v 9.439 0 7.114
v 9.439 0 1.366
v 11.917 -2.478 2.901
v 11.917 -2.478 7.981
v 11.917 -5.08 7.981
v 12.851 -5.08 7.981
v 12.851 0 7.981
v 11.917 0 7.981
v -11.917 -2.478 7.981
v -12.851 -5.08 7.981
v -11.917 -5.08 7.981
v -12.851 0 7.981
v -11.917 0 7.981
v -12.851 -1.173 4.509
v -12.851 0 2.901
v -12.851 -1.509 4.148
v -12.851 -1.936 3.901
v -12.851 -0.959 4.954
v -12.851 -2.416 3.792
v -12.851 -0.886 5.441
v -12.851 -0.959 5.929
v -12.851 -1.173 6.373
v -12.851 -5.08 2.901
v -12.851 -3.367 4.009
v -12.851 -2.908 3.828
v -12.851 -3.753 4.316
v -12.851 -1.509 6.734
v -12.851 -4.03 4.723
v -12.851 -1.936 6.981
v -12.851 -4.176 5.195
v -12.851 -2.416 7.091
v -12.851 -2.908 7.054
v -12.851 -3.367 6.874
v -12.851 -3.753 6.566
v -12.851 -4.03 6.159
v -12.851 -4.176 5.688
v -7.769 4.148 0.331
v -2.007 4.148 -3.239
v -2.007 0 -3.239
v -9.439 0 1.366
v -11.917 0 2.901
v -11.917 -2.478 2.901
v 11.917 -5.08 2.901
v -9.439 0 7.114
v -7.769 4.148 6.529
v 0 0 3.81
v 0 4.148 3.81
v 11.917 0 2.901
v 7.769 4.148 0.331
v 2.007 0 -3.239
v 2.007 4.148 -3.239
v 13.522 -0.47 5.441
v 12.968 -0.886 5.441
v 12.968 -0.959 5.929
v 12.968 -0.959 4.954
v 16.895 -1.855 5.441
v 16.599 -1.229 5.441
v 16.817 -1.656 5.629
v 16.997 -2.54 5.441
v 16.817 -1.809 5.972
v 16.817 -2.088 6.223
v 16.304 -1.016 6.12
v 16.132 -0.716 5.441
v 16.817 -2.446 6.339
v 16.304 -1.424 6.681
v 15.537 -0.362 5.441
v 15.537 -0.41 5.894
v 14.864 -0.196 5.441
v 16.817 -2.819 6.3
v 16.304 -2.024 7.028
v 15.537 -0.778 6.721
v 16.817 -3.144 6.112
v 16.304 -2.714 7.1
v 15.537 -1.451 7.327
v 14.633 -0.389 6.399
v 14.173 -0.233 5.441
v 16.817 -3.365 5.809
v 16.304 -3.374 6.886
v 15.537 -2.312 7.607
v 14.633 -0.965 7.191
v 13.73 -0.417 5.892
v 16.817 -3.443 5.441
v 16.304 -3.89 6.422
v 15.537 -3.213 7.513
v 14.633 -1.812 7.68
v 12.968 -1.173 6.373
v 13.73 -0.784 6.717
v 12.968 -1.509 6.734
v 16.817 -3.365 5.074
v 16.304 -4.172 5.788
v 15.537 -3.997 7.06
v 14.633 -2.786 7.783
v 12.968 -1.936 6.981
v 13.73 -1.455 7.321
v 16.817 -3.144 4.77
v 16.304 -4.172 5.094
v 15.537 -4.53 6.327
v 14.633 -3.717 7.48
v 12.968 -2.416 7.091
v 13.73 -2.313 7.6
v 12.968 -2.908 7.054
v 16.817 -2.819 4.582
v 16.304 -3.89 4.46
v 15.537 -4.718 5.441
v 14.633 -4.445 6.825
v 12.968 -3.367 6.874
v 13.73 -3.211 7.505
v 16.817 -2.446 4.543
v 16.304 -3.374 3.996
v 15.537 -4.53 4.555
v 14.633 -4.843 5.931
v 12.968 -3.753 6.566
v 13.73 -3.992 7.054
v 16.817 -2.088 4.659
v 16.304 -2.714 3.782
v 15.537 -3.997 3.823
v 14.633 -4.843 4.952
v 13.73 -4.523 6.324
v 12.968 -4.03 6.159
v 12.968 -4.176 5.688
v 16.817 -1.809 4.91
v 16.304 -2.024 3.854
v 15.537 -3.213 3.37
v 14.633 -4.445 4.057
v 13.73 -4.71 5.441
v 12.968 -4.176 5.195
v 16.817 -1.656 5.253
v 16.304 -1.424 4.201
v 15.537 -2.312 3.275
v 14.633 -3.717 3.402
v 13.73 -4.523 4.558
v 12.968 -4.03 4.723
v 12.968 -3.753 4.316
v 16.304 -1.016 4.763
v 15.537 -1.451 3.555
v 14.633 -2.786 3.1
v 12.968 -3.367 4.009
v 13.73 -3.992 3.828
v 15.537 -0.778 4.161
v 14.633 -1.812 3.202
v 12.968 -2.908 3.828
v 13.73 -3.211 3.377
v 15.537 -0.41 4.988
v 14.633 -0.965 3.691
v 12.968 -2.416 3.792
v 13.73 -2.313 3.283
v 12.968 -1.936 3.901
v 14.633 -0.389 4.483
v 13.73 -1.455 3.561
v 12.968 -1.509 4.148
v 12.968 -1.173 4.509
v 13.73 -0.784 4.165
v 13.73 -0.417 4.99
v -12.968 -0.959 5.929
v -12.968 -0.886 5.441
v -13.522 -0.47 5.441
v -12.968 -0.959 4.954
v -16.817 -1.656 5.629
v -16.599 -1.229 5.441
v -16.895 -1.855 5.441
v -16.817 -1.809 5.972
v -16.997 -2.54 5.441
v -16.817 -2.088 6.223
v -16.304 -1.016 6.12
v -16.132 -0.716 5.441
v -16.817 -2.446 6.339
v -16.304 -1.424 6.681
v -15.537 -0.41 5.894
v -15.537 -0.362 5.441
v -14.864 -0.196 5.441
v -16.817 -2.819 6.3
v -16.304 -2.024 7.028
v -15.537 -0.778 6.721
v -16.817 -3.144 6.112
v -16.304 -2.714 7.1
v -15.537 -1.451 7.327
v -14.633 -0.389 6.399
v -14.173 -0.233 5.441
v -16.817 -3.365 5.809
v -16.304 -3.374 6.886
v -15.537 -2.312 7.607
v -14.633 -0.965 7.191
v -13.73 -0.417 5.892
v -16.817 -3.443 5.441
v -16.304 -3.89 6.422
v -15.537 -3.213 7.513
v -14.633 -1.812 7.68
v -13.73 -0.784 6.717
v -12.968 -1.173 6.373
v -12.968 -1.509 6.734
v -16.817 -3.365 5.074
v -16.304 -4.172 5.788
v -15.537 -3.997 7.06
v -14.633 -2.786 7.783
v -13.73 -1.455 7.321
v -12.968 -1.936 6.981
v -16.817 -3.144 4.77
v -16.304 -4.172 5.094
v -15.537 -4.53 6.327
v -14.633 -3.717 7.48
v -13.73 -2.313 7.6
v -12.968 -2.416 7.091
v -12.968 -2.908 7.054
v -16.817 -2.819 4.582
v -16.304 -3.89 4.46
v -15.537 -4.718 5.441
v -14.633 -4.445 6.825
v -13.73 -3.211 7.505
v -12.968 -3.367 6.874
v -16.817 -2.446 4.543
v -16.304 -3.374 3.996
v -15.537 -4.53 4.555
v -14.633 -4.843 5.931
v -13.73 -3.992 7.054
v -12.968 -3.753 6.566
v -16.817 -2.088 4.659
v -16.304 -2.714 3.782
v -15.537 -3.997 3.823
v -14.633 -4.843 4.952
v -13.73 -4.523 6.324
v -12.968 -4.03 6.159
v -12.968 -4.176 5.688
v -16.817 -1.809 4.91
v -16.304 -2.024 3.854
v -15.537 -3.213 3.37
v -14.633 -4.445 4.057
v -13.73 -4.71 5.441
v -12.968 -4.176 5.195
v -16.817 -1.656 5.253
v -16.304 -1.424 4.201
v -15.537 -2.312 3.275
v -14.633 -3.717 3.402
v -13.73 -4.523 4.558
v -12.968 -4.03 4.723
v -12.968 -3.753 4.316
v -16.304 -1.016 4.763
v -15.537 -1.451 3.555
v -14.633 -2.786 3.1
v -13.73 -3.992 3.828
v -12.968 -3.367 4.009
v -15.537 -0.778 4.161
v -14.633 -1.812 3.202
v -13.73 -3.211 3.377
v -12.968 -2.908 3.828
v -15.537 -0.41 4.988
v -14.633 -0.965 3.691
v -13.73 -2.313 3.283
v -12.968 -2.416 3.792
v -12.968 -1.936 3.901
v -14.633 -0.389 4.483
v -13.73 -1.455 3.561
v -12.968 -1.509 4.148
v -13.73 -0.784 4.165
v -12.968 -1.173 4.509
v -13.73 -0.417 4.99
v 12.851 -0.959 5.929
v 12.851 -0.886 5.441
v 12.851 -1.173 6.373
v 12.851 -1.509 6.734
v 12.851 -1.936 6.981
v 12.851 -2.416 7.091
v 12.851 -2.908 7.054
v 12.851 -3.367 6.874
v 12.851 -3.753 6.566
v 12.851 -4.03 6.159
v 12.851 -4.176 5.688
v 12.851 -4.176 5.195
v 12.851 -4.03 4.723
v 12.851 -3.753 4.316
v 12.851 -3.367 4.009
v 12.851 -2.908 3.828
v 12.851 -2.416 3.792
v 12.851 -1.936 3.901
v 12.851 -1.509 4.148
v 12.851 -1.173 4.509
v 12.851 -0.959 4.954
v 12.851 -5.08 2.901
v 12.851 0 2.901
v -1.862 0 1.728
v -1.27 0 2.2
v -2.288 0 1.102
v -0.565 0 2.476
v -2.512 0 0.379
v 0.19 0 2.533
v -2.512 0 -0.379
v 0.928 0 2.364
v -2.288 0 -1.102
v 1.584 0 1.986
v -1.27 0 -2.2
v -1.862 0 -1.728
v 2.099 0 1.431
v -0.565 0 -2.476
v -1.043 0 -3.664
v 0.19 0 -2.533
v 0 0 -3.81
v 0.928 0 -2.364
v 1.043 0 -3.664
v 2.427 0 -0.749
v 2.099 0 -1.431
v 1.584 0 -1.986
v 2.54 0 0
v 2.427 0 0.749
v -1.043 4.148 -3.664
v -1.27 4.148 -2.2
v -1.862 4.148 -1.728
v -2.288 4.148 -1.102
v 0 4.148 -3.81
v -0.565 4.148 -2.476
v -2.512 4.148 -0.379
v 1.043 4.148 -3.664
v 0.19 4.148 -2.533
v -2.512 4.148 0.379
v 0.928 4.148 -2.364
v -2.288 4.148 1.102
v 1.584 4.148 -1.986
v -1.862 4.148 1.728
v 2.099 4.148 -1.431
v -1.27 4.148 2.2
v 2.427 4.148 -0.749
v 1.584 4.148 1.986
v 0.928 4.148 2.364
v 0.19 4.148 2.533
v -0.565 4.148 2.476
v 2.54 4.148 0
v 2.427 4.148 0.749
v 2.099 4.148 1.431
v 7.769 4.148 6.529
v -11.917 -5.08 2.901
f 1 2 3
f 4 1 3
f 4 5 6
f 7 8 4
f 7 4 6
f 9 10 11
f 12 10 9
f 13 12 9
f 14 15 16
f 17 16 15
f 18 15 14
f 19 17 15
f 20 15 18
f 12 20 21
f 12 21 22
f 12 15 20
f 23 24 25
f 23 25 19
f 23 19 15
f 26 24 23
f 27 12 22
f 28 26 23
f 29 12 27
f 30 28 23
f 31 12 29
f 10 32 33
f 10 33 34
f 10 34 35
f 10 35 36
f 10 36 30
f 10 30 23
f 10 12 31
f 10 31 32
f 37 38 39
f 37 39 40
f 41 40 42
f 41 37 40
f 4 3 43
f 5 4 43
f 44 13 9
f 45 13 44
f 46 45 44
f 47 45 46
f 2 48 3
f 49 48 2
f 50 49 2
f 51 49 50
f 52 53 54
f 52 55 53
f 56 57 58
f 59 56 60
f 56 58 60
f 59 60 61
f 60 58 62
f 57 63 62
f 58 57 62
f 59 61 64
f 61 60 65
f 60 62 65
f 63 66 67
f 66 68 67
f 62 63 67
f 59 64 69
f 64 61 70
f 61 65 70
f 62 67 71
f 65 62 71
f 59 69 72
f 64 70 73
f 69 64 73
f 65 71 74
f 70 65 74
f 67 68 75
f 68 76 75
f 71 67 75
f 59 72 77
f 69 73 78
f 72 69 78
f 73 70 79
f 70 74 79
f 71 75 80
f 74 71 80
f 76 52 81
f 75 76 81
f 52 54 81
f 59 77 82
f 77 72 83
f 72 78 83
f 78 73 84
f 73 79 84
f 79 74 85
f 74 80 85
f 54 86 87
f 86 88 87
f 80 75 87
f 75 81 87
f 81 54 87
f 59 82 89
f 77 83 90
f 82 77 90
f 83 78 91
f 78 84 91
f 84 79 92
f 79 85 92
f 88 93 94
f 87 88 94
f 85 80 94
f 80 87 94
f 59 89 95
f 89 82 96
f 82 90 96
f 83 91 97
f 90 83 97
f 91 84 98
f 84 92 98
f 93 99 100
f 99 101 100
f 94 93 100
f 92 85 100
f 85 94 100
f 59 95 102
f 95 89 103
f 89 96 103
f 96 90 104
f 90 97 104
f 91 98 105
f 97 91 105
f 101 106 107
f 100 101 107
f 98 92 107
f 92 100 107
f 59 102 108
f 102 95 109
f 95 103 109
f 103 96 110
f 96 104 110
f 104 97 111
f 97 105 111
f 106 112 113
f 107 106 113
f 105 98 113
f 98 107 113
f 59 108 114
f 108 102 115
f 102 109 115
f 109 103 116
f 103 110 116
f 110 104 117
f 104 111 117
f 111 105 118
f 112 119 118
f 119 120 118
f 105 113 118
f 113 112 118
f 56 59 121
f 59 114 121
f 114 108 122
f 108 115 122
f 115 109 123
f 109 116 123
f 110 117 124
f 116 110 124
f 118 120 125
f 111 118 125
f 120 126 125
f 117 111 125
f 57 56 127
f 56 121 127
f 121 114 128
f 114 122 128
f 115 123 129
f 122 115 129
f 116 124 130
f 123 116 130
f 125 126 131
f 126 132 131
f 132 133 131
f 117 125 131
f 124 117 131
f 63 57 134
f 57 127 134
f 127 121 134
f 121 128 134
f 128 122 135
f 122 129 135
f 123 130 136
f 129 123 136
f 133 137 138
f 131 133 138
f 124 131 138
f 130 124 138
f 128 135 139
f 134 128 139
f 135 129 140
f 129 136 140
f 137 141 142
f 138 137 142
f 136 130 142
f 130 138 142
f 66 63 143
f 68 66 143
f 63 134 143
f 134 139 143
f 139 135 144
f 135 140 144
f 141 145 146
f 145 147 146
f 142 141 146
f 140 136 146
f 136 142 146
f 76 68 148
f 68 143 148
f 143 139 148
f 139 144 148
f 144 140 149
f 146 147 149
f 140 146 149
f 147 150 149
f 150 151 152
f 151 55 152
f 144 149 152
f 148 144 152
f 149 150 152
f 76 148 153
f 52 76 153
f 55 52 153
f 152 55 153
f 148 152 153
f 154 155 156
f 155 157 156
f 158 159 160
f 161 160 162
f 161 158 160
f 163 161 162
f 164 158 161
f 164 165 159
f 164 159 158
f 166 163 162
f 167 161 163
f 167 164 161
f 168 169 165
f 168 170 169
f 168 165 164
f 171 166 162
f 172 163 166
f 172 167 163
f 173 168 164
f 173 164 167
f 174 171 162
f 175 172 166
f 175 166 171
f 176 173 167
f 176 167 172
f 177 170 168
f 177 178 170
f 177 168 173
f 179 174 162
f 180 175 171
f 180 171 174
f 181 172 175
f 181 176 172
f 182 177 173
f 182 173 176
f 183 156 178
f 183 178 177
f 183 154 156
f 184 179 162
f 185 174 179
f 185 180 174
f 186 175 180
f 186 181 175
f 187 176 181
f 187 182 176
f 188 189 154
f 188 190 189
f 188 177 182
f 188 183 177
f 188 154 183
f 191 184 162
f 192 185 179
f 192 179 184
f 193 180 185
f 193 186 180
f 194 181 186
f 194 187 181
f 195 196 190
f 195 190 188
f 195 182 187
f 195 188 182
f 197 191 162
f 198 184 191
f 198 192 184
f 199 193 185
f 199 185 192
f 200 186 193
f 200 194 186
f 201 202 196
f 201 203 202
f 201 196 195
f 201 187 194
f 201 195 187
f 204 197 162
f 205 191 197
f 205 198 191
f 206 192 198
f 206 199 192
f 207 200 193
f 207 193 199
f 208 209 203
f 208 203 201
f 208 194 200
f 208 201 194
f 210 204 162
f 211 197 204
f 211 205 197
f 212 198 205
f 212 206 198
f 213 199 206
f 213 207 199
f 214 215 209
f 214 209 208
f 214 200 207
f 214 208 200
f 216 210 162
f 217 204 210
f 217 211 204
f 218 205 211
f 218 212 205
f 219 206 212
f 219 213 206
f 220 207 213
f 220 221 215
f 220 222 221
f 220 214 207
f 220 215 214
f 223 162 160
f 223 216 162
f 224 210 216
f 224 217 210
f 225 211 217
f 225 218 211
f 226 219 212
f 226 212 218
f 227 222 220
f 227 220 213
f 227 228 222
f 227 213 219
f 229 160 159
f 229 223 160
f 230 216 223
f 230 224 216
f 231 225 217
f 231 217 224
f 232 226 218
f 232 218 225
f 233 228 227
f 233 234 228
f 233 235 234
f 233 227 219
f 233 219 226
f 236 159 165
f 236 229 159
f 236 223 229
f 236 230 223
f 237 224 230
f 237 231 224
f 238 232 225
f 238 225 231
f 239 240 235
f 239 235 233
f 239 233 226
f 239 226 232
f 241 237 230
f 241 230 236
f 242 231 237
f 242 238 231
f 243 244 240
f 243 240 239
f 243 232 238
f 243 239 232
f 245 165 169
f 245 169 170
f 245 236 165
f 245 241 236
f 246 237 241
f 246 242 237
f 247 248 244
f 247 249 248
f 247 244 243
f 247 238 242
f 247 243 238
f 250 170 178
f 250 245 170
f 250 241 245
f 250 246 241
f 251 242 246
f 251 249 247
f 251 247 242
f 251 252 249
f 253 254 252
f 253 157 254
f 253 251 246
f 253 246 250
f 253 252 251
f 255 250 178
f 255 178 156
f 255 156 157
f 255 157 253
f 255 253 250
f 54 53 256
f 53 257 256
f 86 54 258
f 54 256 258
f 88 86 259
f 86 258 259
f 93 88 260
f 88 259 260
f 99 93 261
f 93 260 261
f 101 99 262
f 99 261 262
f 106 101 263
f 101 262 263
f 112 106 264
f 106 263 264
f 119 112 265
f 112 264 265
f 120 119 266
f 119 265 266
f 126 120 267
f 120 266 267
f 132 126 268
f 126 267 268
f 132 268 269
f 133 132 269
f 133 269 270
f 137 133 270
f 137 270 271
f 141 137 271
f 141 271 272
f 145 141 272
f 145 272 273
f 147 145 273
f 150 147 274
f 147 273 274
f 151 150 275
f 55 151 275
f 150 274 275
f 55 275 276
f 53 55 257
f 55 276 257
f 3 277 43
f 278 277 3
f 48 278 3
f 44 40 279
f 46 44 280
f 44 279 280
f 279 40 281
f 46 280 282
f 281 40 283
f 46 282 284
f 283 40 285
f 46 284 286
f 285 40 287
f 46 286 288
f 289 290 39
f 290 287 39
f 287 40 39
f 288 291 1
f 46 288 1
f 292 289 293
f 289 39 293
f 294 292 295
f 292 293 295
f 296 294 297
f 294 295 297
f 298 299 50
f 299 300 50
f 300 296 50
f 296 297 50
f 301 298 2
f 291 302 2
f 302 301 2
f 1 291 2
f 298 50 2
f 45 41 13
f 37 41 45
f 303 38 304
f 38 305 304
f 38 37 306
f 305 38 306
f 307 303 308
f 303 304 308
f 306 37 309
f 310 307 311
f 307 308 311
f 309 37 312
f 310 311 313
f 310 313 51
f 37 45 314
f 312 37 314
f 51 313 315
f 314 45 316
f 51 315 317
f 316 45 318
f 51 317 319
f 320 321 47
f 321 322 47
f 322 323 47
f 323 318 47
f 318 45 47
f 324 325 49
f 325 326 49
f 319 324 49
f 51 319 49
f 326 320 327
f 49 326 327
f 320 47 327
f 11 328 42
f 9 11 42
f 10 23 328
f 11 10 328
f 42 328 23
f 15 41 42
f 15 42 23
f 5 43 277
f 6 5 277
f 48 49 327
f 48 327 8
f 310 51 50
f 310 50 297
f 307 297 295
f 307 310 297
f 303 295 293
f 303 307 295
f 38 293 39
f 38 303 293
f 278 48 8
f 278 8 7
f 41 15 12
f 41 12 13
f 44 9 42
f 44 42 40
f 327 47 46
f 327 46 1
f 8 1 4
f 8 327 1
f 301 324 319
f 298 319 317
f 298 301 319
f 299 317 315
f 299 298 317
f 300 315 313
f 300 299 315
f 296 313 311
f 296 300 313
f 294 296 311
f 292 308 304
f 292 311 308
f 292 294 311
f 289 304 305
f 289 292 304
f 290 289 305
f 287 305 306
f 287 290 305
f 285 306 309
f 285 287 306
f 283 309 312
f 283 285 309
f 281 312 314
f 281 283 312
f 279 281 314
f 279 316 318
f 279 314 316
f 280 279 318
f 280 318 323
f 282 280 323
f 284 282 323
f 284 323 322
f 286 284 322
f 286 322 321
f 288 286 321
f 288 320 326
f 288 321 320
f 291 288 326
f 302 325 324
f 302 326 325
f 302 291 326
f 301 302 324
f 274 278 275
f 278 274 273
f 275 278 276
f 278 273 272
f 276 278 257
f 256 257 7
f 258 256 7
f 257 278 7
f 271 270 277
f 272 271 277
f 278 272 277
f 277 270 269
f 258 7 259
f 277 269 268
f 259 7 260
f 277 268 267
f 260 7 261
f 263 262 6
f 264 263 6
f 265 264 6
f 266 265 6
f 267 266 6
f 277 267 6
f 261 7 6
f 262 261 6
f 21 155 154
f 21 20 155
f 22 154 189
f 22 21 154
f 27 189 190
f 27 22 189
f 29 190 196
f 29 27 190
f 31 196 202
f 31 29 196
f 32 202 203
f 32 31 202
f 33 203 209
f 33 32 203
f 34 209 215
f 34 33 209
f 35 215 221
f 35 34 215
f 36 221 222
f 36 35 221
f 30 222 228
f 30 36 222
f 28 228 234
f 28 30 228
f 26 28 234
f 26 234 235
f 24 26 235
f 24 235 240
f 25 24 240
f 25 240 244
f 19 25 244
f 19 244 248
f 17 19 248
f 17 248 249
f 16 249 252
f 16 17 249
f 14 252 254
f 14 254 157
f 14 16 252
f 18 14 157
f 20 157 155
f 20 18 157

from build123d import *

# Parameters (mm, degrees)
SKETCH1_R                = 2.54
BOSS_EXTRUDE1_DEPTH      = 5.08
BOSS_EXTRUDE1_DEPTH_BACK = 5.08
CUT_EXTRUDE1_DEPTH       = 8.981097998
CUT_EXTRUDE1_DEPTH_BACK  = 4.81


with BuildPart() as part:
    # Sketch1 → Boss-Extrude1 (new body, two sides)
    with BuildSketch(Plane(origin=(0, 0, 0), x_dir=(1, 0, 0), z_dir=(0, 1, 0))) as boss_extrude1_sk:
        with BuildLine():
            Line((-2.006502941, 3.238834041), (-11.917388437, -2.901097998))
            Line((-11.917388437, -2.901097998), (-16.997388437, -2.901097998))
            Line((-16.997388437, -2.901097998), (-16.997388437, -7.981097998))
            Line((-16.997388437, -7.981097998), (-11.917388437, -7.981097998))
            Line((-11.917388437, -7.981097998), (0, -3.81))
            Line((0, -3.81), (11.917388437, -7.981097998))
            Line((11.917388437, -7.981097998), (16.997388437, -7.981097998))
            Line((16.997388437, -7.981097998), (16.997388437, -2.901097998))
            Line((16.997388437, -2.901097998), (11.917388437, -2.901097998))
            Line((11.917388437, -2.901097998), (2.006502941, 3.238834041))
            ThreePointArc((2.006502941, 3.238834041), (0, 3.81), (-2.006502941, 3.238834041))
        make_face()
        Circle(SKETCH1_R, mode=Mode.SUBTRACT)
    extrude(amount=BOSS_EXTRUDE1_DEPTH)
    extrude(boss_extrude1_sk.sketch, amount=-BOSS_EXTRUDE1_DEPTH_BACK)

    # Sketch2 → Cut-Extrude1 (cut, two sides)
    with BuildSketch(Plane.XY) as cut_extrude1_sk:
        Polygon((-11.917388437, -6.525255909), (-11.917388437, -2.478330742), (-9.439057695, 0), (9.439057695, 0), (11.917388437, -2.478330742), (11.917388437, -6.525255909), align=None)
        Polygon((-18.093487835, 0), (-11.917388437, 0), (-7.769454267, 4.147934171), (7.769454267, 4.147934171), (11.917388437, 0), (18.118549734, 0), (18.118549734, 7.57171578), (-18.093487835, 7.57171578), align=None)
    extrude(amount=CUT_EXTRUDE1_DEPTH, mode=Mode.SUBTRACT)
    extrude(cut_extrude1_sk.sketch, amount=-CUT_EXTRUDE1_DEPTH_BACK, mode=Mode.SUBTRACT)

    # Sketch3 → Cut-Revolve1 (revolve, cut)
    with BuildSketch(Plane.XY.offset(5.441097998)):
        with BuildLine():
            Line((-12.967633979, -0.885782562), (-12.851197898, -0.885782562))
            Line((-12.851197898, -0.885782562), (-12.851197898, 1.801061794))
            Line((-12.851197898, 1.801061794), (-18.158310447, 1.801061794))
            Line((-18.158310447, 1.801061794), (-18.158310447, -2.54))
            Line((-18.158310447, -2.54), (-16.997388437, -2.54))
            ThreePointArc((-16.997388437, -2.54), (-15.537067777, -0.361964398), (-12.967633979, -0.885782562))
        make_face()
        with BuildLine():
            Line((12.851197898, -0.885782562), (12.851197898, 1.801061794))
            Line((12.851197898, 1.801061794), (18.158310447, 1.801061794))
            Line((18.158310447, 1.801061794), (18.158310447, -2.54))
            Line((18.158310447, -2.54), (16.997388437, -2.54))
            ThreePointArc((16.997388437, -2.54), (15.537067777, -0.361964398), (12.967633979, -0.885782562))
            Line((12.967633979, -0.885782562), (12.851197898, -0.885782562))
        make_face()
    revolve(axis=Axis((-16.997388437, -2.54, 5.441097998), (1, 0, 0)), mode=Mode.SUBTRACT)


solid = part.part
